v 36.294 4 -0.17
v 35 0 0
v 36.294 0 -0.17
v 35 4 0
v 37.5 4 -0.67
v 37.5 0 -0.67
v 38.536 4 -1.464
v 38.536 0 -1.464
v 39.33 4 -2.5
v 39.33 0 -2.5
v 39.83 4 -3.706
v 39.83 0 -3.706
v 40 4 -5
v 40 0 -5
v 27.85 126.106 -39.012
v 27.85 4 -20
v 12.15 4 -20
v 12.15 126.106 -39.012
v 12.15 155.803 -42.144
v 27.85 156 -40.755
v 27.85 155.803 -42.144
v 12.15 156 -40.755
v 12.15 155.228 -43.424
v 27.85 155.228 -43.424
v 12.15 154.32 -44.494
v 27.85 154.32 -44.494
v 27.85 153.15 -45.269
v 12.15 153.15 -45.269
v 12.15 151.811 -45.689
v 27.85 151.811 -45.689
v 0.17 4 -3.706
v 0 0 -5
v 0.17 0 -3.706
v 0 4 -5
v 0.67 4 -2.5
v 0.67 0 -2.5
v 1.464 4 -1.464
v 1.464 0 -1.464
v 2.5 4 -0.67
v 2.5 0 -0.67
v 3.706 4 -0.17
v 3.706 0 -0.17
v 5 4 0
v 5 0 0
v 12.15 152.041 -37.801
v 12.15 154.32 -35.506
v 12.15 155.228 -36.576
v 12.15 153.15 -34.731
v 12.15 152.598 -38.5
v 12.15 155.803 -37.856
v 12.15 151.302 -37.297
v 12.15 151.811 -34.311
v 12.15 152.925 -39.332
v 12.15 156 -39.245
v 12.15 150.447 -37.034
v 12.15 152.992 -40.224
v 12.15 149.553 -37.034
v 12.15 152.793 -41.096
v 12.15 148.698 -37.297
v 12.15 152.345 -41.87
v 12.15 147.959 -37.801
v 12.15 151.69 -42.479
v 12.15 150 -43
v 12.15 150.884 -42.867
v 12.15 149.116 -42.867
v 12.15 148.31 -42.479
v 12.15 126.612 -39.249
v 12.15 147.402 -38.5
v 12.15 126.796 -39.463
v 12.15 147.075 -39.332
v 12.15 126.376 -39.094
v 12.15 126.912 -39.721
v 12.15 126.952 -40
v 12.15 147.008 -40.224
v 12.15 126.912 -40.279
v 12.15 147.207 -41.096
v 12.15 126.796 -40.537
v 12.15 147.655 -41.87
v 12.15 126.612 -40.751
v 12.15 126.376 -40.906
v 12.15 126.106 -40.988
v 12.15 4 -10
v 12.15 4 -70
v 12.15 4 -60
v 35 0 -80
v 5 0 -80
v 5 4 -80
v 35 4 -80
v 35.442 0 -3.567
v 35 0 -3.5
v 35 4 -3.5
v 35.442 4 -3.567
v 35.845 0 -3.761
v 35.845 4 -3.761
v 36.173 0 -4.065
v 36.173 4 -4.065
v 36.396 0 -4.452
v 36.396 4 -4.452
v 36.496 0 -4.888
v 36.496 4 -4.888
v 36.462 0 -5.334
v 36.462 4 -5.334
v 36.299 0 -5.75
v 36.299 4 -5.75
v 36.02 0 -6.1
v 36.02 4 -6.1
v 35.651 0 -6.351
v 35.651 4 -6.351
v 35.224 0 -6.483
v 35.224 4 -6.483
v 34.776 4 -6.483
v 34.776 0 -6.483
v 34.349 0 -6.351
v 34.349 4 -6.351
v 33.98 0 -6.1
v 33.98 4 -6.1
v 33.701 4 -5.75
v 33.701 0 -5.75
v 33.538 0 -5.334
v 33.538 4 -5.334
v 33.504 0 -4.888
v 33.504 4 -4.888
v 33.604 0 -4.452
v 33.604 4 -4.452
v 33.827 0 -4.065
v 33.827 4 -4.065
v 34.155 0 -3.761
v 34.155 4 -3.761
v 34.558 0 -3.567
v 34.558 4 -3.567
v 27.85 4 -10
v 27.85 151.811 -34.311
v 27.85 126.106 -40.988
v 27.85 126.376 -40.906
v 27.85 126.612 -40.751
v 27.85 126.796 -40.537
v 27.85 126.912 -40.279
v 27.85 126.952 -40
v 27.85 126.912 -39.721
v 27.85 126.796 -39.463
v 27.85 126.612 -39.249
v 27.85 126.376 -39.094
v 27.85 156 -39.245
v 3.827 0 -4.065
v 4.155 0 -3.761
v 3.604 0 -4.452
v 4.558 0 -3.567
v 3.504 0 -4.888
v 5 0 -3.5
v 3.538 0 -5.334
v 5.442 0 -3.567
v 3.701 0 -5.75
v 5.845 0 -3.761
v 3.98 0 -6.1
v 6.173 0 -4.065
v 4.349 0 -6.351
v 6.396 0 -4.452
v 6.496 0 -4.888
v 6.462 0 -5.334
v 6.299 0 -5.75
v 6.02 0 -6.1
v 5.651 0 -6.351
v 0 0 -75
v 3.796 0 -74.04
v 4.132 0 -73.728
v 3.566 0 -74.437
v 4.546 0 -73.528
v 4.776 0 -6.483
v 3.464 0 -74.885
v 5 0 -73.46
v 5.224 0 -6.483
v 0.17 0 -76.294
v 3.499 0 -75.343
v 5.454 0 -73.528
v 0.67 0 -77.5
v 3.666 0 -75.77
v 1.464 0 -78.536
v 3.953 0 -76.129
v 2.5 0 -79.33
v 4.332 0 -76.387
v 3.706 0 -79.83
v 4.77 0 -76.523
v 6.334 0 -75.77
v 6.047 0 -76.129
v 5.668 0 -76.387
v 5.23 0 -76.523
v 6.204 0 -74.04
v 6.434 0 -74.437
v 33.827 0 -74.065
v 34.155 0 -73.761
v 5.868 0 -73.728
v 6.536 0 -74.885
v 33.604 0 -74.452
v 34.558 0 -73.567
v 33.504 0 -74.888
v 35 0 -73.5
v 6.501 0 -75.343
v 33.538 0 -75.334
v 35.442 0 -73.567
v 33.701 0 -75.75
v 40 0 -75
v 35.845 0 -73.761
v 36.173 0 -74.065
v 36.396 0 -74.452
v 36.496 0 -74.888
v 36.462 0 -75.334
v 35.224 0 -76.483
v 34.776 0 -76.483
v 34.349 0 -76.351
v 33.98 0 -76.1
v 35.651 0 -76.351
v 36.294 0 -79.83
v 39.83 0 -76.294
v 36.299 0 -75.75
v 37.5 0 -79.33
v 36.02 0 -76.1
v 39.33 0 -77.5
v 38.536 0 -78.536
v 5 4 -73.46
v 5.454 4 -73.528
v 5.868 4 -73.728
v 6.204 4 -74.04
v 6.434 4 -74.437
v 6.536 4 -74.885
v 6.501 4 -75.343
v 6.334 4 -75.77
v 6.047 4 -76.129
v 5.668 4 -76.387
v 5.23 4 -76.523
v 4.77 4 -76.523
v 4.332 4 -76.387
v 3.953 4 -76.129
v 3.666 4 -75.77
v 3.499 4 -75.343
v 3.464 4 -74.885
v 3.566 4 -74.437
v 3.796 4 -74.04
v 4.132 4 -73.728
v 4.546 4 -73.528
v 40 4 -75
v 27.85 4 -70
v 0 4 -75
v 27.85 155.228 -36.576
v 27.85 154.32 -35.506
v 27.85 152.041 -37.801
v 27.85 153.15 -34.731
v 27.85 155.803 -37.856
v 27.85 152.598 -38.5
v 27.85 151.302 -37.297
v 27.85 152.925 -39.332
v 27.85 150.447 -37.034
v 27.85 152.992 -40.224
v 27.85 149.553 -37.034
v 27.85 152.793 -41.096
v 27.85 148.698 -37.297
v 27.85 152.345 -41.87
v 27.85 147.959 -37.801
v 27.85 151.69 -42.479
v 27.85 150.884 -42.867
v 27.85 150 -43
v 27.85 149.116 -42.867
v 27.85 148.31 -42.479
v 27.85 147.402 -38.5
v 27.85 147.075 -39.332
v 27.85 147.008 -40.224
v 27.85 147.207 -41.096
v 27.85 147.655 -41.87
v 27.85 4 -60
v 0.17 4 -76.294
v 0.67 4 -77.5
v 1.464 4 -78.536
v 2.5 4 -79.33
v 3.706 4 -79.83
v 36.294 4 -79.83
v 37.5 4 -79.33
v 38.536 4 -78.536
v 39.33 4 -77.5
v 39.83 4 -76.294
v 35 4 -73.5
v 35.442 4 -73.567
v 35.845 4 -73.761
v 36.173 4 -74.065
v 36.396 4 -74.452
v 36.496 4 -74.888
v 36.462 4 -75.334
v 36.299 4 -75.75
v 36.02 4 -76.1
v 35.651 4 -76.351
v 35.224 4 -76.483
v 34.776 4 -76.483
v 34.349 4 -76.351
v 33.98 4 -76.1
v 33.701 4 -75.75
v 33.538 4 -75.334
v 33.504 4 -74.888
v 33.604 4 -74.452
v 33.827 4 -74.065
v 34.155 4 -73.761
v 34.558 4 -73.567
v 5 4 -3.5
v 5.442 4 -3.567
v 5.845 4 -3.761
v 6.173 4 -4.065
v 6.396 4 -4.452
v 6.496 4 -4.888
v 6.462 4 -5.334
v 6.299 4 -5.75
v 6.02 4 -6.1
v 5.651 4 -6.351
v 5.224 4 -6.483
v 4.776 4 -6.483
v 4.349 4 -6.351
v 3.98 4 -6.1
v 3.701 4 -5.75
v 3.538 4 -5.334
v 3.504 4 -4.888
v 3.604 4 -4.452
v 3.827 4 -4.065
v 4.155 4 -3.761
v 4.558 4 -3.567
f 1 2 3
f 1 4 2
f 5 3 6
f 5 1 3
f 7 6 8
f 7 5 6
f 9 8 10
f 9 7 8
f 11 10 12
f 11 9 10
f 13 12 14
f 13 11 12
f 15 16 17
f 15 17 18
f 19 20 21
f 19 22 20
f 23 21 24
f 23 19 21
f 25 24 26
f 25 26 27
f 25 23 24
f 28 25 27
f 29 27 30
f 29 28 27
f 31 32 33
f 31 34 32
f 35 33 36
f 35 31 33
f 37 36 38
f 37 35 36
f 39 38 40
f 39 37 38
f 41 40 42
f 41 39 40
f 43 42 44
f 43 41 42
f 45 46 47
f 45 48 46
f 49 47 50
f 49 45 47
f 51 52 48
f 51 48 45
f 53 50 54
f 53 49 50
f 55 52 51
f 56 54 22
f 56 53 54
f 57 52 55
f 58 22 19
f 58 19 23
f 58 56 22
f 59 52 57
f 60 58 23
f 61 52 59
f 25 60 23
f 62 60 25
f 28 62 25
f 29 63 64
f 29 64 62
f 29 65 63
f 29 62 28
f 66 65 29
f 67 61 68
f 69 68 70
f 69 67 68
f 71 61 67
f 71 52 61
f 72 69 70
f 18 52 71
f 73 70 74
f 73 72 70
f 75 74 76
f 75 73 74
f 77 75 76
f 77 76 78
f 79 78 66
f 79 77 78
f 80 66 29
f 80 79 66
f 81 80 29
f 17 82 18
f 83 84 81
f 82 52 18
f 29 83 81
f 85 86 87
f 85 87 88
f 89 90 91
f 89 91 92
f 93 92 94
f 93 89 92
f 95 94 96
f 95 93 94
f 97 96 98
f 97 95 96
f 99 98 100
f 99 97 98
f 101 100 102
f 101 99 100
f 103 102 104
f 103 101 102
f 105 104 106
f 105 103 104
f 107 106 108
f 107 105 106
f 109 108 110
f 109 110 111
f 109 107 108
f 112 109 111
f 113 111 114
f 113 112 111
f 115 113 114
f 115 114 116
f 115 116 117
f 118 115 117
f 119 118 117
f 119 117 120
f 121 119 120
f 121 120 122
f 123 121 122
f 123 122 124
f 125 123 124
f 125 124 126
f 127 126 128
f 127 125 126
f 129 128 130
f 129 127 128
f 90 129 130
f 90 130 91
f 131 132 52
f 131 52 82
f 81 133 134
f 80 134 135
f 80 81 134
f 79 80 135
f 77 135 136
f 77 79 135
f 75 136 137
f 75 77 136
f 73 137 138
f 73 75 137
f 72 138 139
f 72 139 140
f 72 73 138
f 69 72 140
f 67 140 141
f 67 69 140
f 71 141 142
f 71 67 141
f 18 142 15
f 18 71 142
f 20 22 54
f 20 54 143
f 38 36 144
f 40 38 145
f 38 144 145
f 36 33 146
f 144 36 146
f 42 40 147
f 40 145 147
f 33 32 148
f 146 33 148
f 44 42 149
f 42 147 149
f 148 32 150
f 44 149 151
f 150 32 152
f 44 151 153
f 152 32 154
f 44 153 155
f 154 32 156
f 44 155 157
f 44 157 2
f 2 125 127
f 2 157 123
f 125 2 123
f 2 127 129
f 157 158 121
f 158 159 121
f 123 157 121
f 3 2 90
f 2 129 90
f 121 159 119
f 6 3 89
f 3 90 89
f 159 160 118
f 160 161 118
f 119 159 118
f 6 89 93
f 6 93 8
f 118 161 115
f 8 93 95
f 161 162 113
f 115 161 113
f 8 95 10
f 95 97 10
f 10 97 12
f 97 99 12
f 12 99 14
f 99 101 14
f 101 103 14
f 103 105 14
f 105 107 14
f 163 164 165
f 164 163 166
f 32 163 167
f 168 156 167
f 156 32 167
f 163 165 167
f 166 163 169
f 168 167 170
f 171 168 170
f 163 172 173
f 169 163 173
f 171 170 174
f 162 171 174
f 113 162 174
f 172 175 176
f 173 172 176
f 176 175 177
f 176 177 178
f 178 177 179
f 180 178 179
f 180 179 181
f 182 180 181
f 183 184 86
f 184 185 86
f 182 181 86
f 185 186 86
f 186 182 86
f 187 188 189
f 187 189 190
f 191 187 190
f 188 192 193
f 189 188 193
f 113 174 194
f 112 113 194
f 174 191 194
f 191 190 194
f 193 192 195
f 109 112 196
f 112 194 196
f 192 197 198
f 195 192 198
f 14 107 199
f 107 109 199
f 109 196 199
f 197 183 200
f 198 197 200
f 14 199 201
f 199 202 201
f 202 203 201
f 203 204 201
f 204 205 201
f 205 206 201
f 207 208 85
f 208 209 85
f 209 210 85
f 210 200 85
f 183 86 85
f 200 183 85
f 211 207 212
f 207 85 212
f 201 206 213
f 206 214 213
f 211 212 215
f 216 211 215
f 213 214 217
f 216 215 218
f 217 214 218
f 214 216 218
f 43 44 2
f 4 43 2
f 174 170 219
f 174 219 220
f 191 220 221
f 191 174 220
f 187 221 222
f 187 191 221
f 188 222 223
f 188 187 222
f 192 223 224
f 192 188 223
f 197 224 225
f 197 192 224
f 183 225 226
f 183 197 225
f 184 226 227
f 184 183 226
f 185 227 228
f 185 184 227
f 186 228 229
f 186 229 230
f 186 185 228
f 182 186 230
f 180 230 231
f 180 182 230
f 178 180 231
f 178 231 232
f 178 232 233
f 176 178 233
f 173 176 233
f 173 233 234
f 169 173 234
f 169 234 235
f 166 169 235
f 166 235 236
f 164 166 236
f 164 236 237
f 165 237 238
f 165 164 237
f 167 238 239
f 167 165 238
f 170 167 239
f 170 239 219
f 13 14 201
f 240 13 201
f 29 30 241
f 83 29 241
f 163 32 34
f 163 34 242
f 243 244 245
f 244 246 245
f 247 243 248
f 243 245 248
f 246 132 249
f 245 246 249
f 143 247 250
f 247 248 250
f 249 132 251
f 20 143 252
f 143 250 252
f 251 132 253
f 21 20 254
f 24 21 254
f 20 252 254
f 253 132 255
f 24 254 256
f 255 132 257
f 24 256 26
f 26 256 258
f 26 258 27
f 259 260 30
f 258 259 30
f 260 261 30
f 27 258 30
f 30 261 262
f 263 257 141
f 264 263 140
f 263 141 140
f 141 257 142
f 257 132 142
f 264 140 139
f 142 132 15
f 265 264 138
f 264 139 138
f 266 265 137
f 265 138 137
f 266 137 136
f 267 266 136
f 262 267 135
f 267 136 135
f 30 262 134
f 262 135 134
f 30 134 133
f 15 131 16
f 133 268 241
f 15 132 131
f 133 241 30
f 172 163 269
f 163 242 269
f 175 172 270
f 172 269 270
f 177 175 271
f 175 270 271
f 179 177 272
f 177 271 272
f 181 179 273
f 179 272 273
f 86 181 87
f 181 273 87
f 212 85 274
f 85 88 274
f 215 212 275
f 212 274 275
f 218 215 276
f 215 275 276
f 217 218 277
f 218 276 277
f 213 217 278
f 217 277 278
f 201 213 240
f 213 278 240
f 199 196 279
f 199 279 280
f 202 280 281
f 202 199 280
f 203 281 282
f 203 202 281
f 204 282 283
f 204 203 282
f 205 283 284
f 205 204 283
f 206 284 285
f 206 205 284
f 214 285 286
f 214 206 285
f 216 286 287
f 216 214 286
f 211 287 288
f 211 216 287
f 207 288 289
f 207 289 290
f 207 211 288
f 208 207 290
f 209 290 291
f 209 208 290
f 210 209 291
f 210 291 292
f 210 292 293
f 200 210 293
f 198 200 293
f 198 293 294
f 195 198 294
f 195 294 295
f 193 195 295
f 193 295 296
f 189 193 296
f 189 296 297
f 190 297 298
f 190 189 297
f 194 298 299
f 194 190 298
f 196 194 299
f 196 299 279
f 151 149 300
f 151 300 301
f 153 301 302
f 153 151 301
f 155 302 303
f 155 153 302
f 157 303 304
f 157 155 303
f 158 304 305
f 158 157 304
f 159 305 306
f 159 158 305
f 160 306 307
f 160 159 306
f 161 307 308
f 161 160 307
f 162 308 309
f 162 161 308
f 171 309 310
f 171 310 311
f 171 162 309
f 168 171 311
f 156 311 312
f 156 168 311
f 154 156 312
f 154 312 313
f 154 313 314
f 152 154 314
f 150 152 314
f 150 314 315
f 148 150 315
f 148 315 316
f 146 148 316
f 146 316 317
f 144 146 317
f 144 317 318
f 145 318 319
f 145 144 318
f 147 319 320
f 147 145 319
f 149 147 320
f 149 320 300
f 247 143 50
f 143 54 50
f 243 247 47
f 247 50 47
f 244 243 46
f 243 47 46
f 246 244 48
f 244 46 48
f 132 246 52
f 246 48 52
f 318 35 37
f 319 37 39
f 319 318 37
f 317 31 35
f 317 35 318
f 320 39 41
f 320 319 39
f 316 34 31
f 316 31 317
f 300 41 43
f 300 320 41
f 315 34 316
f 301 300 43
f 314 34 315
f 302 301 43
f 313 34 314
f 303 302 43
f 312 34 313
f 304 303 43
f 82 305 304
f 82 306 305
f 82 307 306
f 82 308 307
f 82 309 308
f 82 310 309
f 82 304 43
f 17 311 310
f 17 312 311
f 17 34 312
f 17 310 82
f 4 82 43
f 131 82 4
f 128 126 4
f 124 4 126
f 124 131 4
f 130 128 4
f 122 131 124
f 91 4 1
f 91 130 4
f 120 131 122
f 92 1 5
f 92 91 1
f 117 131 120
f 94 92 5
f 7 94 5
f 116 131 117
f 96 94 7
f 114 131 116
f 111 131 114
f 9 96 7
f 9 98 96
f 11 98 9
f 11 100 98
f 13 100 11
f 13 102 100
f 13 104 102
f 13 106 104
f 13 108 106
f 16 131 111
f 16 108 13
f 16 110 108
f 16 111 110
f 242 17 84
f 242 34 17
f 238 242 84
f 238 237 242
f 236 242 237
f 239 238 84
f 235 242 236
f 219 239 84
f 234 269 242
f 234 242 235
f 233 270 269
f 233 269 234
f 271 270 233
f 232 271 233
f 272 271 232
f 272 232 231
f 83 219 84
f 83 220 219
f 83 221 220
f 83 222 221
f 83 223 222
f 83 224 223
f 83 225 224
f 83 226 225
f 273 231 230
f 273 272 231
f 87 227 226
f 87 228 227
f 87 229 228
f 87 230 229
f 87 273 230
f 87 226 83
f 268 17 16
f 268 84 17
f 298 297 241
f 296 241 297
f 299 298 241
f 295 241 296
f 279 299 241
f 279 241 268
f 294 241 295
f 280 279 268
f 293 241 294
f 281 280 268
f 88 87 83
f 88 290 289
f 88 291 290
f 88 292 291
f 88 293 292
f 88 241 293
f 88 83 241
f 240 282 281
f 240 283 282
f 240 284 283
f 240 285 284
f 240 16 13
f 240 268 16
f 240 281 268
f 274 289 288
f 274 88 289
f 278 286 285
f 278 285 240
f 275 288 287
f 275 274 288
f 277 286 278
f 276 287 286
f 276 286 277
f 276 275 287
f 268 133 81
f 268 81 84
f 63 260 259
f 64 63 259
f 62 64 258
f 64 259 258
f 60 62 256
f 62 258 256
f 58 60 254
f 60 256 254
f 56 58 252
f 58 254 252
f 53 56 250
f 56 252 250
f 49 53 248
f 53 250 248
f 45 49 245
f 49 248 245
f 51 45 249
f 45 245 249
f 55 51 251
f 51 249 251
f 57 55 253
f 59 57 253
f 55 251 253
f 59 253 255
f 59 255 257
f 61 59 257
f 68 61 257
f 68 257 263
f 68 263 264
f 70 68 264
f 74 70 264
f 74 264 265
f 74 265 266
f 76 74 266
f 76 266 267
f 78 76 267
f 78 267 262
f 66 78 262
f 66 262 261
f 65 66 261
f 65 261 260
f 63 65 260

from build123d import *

# Parameters (mm, degrees)
SKETCH1_W           = 40
SKETCH1_H           = 80
SKETCH1_R           = 1.54
SKETCH1_R_2         = 1.5
BOSS_EXTRUDE1_DEPTH = 4
FILLET1_R           = 5
SKETCH2_W           = 15.7
SKETCH2_H           = 60
BOSS_EXTRUDE2_DEPTH = 152
SKETCH3_R           = 3
CUT_EXTRUDE1_DEPTH  = 160
CUT_EXTRUDE2_DEPTH  = 160
FILLET2_R           = 5
CUT_EXTRUDE3_DEPTH  = 160
FILLET3_R           = 1


with BuildPart() as part:
    # Sketch1 → Boss-Extrude1 (new body)
    with BuildSketch(Plane(origin=(0, 0, 0), x_dir=(1, 0, 0), z_dir=(0, 1, 0))):
        with Locations((20, 40)):
            Rectangle(SKETCH1_W, SKETCH1_H)
        with Locations(Location((5, 75, 0), (0, 0, 270))):
            Circle(SKETCH1_R, mode=Mode.SUBTRACT)
        with Locations(Location((35, 75, 0), (0, 0, 270))):
            Circle(SKETCH1_R_2, mode=Mode.SUBTRACT)
        with Locations(Location((5, 5, 0), (0, 0, 270))):
            Circle(SKETCH1_R_2, mode=Mode.SUBTRACT)
        with Locations(Location((35, 5, 0), (0, 0, 270))):
            Circle(SKETCH1_R_2, mode=Mode.SUBTRACT)
    extrude(amount=BOSS_EXTRUDE1_DEPTH)

    # Fillet1
    fillet1_edges = [part.edges().sort_by_distance(p)[0] for p in [
        (0, 2, -80),
        (40, 2, -80),
        (40, 2, 0),
        (0, 2, 0),
    ]]
    fillet(fillet1_edges, radius=FILLET1_R)

    # Sketch2 → Boss-Extrude2 (add)
    with BuildSketch(Plane(origin=(0, 4, 0), x_dir=(1, 0, 0), z_dir=(0, 1, 0))):
        with Locations((20, 40)):
            Rectangle(SKETCH2_W, SKETCH2_H)
    extrude(amount=BOSS_EXTRUDE2_DEPTH)

    # Sketch3 → Cut-Extrude1 (cut)
    with BuildSketch(Plane(origin=(40, 0, 0), x_dir=(0, 0, -1), z_dir=(1, 0, 0))):
        with Locations((40, 150)):
            Circle(SKETCH3_R)
    extrude(amount=-CUT_EXTRUDE1_DEPTH, mode=Mode.SUBTRACT)

    # Sketch4 → Cut-Extrude2 (cut)
    with BuildSketch(Plane(origin=(40, 0, 0), x_dir=(0, 0, -1), z_dir=(1, 0, 0))):
        Polygon((35, 156), (10, 4), (10, 156), align=None)
        Polygon((45, 156), (70, 4), (70, 156), align=None)
    extrude(amount=-CUT_EXTRUDE2_DEPTH, mode=Mode.SUBTRACT)

    # Fillet2
    fillet2_edges = [part.edges().sort_by_distance(p)[0] for p in [
        (20, 156, -45),
        (20, 156, -35),
    ]]
    fillet(fillet2_edges, radius=FILLET2_R)

    # Sketch5 → Cut-Extrude3 (cut)
    with BuildSketch(Plane(origin=(27.85, 0, 0), x_dir=(0, 0, -1), z_dir=(1, 0, 0))):
        Polygon((20, 4), (40, 132.452325787), (60, 4), align=None)
    extrude(amount=-CUT_EXTRUDE3_DEPTH, mode=Mode.SUBTRACT)

    # Fillet3
    fillet3_edges = [part.edges().sort_by_distance(p)[0] for p in [
        (20, 132.452325787, -40),
    ]]
    fillet(fillet3_edges, radius=FILLET3_R)


solid = part.part
